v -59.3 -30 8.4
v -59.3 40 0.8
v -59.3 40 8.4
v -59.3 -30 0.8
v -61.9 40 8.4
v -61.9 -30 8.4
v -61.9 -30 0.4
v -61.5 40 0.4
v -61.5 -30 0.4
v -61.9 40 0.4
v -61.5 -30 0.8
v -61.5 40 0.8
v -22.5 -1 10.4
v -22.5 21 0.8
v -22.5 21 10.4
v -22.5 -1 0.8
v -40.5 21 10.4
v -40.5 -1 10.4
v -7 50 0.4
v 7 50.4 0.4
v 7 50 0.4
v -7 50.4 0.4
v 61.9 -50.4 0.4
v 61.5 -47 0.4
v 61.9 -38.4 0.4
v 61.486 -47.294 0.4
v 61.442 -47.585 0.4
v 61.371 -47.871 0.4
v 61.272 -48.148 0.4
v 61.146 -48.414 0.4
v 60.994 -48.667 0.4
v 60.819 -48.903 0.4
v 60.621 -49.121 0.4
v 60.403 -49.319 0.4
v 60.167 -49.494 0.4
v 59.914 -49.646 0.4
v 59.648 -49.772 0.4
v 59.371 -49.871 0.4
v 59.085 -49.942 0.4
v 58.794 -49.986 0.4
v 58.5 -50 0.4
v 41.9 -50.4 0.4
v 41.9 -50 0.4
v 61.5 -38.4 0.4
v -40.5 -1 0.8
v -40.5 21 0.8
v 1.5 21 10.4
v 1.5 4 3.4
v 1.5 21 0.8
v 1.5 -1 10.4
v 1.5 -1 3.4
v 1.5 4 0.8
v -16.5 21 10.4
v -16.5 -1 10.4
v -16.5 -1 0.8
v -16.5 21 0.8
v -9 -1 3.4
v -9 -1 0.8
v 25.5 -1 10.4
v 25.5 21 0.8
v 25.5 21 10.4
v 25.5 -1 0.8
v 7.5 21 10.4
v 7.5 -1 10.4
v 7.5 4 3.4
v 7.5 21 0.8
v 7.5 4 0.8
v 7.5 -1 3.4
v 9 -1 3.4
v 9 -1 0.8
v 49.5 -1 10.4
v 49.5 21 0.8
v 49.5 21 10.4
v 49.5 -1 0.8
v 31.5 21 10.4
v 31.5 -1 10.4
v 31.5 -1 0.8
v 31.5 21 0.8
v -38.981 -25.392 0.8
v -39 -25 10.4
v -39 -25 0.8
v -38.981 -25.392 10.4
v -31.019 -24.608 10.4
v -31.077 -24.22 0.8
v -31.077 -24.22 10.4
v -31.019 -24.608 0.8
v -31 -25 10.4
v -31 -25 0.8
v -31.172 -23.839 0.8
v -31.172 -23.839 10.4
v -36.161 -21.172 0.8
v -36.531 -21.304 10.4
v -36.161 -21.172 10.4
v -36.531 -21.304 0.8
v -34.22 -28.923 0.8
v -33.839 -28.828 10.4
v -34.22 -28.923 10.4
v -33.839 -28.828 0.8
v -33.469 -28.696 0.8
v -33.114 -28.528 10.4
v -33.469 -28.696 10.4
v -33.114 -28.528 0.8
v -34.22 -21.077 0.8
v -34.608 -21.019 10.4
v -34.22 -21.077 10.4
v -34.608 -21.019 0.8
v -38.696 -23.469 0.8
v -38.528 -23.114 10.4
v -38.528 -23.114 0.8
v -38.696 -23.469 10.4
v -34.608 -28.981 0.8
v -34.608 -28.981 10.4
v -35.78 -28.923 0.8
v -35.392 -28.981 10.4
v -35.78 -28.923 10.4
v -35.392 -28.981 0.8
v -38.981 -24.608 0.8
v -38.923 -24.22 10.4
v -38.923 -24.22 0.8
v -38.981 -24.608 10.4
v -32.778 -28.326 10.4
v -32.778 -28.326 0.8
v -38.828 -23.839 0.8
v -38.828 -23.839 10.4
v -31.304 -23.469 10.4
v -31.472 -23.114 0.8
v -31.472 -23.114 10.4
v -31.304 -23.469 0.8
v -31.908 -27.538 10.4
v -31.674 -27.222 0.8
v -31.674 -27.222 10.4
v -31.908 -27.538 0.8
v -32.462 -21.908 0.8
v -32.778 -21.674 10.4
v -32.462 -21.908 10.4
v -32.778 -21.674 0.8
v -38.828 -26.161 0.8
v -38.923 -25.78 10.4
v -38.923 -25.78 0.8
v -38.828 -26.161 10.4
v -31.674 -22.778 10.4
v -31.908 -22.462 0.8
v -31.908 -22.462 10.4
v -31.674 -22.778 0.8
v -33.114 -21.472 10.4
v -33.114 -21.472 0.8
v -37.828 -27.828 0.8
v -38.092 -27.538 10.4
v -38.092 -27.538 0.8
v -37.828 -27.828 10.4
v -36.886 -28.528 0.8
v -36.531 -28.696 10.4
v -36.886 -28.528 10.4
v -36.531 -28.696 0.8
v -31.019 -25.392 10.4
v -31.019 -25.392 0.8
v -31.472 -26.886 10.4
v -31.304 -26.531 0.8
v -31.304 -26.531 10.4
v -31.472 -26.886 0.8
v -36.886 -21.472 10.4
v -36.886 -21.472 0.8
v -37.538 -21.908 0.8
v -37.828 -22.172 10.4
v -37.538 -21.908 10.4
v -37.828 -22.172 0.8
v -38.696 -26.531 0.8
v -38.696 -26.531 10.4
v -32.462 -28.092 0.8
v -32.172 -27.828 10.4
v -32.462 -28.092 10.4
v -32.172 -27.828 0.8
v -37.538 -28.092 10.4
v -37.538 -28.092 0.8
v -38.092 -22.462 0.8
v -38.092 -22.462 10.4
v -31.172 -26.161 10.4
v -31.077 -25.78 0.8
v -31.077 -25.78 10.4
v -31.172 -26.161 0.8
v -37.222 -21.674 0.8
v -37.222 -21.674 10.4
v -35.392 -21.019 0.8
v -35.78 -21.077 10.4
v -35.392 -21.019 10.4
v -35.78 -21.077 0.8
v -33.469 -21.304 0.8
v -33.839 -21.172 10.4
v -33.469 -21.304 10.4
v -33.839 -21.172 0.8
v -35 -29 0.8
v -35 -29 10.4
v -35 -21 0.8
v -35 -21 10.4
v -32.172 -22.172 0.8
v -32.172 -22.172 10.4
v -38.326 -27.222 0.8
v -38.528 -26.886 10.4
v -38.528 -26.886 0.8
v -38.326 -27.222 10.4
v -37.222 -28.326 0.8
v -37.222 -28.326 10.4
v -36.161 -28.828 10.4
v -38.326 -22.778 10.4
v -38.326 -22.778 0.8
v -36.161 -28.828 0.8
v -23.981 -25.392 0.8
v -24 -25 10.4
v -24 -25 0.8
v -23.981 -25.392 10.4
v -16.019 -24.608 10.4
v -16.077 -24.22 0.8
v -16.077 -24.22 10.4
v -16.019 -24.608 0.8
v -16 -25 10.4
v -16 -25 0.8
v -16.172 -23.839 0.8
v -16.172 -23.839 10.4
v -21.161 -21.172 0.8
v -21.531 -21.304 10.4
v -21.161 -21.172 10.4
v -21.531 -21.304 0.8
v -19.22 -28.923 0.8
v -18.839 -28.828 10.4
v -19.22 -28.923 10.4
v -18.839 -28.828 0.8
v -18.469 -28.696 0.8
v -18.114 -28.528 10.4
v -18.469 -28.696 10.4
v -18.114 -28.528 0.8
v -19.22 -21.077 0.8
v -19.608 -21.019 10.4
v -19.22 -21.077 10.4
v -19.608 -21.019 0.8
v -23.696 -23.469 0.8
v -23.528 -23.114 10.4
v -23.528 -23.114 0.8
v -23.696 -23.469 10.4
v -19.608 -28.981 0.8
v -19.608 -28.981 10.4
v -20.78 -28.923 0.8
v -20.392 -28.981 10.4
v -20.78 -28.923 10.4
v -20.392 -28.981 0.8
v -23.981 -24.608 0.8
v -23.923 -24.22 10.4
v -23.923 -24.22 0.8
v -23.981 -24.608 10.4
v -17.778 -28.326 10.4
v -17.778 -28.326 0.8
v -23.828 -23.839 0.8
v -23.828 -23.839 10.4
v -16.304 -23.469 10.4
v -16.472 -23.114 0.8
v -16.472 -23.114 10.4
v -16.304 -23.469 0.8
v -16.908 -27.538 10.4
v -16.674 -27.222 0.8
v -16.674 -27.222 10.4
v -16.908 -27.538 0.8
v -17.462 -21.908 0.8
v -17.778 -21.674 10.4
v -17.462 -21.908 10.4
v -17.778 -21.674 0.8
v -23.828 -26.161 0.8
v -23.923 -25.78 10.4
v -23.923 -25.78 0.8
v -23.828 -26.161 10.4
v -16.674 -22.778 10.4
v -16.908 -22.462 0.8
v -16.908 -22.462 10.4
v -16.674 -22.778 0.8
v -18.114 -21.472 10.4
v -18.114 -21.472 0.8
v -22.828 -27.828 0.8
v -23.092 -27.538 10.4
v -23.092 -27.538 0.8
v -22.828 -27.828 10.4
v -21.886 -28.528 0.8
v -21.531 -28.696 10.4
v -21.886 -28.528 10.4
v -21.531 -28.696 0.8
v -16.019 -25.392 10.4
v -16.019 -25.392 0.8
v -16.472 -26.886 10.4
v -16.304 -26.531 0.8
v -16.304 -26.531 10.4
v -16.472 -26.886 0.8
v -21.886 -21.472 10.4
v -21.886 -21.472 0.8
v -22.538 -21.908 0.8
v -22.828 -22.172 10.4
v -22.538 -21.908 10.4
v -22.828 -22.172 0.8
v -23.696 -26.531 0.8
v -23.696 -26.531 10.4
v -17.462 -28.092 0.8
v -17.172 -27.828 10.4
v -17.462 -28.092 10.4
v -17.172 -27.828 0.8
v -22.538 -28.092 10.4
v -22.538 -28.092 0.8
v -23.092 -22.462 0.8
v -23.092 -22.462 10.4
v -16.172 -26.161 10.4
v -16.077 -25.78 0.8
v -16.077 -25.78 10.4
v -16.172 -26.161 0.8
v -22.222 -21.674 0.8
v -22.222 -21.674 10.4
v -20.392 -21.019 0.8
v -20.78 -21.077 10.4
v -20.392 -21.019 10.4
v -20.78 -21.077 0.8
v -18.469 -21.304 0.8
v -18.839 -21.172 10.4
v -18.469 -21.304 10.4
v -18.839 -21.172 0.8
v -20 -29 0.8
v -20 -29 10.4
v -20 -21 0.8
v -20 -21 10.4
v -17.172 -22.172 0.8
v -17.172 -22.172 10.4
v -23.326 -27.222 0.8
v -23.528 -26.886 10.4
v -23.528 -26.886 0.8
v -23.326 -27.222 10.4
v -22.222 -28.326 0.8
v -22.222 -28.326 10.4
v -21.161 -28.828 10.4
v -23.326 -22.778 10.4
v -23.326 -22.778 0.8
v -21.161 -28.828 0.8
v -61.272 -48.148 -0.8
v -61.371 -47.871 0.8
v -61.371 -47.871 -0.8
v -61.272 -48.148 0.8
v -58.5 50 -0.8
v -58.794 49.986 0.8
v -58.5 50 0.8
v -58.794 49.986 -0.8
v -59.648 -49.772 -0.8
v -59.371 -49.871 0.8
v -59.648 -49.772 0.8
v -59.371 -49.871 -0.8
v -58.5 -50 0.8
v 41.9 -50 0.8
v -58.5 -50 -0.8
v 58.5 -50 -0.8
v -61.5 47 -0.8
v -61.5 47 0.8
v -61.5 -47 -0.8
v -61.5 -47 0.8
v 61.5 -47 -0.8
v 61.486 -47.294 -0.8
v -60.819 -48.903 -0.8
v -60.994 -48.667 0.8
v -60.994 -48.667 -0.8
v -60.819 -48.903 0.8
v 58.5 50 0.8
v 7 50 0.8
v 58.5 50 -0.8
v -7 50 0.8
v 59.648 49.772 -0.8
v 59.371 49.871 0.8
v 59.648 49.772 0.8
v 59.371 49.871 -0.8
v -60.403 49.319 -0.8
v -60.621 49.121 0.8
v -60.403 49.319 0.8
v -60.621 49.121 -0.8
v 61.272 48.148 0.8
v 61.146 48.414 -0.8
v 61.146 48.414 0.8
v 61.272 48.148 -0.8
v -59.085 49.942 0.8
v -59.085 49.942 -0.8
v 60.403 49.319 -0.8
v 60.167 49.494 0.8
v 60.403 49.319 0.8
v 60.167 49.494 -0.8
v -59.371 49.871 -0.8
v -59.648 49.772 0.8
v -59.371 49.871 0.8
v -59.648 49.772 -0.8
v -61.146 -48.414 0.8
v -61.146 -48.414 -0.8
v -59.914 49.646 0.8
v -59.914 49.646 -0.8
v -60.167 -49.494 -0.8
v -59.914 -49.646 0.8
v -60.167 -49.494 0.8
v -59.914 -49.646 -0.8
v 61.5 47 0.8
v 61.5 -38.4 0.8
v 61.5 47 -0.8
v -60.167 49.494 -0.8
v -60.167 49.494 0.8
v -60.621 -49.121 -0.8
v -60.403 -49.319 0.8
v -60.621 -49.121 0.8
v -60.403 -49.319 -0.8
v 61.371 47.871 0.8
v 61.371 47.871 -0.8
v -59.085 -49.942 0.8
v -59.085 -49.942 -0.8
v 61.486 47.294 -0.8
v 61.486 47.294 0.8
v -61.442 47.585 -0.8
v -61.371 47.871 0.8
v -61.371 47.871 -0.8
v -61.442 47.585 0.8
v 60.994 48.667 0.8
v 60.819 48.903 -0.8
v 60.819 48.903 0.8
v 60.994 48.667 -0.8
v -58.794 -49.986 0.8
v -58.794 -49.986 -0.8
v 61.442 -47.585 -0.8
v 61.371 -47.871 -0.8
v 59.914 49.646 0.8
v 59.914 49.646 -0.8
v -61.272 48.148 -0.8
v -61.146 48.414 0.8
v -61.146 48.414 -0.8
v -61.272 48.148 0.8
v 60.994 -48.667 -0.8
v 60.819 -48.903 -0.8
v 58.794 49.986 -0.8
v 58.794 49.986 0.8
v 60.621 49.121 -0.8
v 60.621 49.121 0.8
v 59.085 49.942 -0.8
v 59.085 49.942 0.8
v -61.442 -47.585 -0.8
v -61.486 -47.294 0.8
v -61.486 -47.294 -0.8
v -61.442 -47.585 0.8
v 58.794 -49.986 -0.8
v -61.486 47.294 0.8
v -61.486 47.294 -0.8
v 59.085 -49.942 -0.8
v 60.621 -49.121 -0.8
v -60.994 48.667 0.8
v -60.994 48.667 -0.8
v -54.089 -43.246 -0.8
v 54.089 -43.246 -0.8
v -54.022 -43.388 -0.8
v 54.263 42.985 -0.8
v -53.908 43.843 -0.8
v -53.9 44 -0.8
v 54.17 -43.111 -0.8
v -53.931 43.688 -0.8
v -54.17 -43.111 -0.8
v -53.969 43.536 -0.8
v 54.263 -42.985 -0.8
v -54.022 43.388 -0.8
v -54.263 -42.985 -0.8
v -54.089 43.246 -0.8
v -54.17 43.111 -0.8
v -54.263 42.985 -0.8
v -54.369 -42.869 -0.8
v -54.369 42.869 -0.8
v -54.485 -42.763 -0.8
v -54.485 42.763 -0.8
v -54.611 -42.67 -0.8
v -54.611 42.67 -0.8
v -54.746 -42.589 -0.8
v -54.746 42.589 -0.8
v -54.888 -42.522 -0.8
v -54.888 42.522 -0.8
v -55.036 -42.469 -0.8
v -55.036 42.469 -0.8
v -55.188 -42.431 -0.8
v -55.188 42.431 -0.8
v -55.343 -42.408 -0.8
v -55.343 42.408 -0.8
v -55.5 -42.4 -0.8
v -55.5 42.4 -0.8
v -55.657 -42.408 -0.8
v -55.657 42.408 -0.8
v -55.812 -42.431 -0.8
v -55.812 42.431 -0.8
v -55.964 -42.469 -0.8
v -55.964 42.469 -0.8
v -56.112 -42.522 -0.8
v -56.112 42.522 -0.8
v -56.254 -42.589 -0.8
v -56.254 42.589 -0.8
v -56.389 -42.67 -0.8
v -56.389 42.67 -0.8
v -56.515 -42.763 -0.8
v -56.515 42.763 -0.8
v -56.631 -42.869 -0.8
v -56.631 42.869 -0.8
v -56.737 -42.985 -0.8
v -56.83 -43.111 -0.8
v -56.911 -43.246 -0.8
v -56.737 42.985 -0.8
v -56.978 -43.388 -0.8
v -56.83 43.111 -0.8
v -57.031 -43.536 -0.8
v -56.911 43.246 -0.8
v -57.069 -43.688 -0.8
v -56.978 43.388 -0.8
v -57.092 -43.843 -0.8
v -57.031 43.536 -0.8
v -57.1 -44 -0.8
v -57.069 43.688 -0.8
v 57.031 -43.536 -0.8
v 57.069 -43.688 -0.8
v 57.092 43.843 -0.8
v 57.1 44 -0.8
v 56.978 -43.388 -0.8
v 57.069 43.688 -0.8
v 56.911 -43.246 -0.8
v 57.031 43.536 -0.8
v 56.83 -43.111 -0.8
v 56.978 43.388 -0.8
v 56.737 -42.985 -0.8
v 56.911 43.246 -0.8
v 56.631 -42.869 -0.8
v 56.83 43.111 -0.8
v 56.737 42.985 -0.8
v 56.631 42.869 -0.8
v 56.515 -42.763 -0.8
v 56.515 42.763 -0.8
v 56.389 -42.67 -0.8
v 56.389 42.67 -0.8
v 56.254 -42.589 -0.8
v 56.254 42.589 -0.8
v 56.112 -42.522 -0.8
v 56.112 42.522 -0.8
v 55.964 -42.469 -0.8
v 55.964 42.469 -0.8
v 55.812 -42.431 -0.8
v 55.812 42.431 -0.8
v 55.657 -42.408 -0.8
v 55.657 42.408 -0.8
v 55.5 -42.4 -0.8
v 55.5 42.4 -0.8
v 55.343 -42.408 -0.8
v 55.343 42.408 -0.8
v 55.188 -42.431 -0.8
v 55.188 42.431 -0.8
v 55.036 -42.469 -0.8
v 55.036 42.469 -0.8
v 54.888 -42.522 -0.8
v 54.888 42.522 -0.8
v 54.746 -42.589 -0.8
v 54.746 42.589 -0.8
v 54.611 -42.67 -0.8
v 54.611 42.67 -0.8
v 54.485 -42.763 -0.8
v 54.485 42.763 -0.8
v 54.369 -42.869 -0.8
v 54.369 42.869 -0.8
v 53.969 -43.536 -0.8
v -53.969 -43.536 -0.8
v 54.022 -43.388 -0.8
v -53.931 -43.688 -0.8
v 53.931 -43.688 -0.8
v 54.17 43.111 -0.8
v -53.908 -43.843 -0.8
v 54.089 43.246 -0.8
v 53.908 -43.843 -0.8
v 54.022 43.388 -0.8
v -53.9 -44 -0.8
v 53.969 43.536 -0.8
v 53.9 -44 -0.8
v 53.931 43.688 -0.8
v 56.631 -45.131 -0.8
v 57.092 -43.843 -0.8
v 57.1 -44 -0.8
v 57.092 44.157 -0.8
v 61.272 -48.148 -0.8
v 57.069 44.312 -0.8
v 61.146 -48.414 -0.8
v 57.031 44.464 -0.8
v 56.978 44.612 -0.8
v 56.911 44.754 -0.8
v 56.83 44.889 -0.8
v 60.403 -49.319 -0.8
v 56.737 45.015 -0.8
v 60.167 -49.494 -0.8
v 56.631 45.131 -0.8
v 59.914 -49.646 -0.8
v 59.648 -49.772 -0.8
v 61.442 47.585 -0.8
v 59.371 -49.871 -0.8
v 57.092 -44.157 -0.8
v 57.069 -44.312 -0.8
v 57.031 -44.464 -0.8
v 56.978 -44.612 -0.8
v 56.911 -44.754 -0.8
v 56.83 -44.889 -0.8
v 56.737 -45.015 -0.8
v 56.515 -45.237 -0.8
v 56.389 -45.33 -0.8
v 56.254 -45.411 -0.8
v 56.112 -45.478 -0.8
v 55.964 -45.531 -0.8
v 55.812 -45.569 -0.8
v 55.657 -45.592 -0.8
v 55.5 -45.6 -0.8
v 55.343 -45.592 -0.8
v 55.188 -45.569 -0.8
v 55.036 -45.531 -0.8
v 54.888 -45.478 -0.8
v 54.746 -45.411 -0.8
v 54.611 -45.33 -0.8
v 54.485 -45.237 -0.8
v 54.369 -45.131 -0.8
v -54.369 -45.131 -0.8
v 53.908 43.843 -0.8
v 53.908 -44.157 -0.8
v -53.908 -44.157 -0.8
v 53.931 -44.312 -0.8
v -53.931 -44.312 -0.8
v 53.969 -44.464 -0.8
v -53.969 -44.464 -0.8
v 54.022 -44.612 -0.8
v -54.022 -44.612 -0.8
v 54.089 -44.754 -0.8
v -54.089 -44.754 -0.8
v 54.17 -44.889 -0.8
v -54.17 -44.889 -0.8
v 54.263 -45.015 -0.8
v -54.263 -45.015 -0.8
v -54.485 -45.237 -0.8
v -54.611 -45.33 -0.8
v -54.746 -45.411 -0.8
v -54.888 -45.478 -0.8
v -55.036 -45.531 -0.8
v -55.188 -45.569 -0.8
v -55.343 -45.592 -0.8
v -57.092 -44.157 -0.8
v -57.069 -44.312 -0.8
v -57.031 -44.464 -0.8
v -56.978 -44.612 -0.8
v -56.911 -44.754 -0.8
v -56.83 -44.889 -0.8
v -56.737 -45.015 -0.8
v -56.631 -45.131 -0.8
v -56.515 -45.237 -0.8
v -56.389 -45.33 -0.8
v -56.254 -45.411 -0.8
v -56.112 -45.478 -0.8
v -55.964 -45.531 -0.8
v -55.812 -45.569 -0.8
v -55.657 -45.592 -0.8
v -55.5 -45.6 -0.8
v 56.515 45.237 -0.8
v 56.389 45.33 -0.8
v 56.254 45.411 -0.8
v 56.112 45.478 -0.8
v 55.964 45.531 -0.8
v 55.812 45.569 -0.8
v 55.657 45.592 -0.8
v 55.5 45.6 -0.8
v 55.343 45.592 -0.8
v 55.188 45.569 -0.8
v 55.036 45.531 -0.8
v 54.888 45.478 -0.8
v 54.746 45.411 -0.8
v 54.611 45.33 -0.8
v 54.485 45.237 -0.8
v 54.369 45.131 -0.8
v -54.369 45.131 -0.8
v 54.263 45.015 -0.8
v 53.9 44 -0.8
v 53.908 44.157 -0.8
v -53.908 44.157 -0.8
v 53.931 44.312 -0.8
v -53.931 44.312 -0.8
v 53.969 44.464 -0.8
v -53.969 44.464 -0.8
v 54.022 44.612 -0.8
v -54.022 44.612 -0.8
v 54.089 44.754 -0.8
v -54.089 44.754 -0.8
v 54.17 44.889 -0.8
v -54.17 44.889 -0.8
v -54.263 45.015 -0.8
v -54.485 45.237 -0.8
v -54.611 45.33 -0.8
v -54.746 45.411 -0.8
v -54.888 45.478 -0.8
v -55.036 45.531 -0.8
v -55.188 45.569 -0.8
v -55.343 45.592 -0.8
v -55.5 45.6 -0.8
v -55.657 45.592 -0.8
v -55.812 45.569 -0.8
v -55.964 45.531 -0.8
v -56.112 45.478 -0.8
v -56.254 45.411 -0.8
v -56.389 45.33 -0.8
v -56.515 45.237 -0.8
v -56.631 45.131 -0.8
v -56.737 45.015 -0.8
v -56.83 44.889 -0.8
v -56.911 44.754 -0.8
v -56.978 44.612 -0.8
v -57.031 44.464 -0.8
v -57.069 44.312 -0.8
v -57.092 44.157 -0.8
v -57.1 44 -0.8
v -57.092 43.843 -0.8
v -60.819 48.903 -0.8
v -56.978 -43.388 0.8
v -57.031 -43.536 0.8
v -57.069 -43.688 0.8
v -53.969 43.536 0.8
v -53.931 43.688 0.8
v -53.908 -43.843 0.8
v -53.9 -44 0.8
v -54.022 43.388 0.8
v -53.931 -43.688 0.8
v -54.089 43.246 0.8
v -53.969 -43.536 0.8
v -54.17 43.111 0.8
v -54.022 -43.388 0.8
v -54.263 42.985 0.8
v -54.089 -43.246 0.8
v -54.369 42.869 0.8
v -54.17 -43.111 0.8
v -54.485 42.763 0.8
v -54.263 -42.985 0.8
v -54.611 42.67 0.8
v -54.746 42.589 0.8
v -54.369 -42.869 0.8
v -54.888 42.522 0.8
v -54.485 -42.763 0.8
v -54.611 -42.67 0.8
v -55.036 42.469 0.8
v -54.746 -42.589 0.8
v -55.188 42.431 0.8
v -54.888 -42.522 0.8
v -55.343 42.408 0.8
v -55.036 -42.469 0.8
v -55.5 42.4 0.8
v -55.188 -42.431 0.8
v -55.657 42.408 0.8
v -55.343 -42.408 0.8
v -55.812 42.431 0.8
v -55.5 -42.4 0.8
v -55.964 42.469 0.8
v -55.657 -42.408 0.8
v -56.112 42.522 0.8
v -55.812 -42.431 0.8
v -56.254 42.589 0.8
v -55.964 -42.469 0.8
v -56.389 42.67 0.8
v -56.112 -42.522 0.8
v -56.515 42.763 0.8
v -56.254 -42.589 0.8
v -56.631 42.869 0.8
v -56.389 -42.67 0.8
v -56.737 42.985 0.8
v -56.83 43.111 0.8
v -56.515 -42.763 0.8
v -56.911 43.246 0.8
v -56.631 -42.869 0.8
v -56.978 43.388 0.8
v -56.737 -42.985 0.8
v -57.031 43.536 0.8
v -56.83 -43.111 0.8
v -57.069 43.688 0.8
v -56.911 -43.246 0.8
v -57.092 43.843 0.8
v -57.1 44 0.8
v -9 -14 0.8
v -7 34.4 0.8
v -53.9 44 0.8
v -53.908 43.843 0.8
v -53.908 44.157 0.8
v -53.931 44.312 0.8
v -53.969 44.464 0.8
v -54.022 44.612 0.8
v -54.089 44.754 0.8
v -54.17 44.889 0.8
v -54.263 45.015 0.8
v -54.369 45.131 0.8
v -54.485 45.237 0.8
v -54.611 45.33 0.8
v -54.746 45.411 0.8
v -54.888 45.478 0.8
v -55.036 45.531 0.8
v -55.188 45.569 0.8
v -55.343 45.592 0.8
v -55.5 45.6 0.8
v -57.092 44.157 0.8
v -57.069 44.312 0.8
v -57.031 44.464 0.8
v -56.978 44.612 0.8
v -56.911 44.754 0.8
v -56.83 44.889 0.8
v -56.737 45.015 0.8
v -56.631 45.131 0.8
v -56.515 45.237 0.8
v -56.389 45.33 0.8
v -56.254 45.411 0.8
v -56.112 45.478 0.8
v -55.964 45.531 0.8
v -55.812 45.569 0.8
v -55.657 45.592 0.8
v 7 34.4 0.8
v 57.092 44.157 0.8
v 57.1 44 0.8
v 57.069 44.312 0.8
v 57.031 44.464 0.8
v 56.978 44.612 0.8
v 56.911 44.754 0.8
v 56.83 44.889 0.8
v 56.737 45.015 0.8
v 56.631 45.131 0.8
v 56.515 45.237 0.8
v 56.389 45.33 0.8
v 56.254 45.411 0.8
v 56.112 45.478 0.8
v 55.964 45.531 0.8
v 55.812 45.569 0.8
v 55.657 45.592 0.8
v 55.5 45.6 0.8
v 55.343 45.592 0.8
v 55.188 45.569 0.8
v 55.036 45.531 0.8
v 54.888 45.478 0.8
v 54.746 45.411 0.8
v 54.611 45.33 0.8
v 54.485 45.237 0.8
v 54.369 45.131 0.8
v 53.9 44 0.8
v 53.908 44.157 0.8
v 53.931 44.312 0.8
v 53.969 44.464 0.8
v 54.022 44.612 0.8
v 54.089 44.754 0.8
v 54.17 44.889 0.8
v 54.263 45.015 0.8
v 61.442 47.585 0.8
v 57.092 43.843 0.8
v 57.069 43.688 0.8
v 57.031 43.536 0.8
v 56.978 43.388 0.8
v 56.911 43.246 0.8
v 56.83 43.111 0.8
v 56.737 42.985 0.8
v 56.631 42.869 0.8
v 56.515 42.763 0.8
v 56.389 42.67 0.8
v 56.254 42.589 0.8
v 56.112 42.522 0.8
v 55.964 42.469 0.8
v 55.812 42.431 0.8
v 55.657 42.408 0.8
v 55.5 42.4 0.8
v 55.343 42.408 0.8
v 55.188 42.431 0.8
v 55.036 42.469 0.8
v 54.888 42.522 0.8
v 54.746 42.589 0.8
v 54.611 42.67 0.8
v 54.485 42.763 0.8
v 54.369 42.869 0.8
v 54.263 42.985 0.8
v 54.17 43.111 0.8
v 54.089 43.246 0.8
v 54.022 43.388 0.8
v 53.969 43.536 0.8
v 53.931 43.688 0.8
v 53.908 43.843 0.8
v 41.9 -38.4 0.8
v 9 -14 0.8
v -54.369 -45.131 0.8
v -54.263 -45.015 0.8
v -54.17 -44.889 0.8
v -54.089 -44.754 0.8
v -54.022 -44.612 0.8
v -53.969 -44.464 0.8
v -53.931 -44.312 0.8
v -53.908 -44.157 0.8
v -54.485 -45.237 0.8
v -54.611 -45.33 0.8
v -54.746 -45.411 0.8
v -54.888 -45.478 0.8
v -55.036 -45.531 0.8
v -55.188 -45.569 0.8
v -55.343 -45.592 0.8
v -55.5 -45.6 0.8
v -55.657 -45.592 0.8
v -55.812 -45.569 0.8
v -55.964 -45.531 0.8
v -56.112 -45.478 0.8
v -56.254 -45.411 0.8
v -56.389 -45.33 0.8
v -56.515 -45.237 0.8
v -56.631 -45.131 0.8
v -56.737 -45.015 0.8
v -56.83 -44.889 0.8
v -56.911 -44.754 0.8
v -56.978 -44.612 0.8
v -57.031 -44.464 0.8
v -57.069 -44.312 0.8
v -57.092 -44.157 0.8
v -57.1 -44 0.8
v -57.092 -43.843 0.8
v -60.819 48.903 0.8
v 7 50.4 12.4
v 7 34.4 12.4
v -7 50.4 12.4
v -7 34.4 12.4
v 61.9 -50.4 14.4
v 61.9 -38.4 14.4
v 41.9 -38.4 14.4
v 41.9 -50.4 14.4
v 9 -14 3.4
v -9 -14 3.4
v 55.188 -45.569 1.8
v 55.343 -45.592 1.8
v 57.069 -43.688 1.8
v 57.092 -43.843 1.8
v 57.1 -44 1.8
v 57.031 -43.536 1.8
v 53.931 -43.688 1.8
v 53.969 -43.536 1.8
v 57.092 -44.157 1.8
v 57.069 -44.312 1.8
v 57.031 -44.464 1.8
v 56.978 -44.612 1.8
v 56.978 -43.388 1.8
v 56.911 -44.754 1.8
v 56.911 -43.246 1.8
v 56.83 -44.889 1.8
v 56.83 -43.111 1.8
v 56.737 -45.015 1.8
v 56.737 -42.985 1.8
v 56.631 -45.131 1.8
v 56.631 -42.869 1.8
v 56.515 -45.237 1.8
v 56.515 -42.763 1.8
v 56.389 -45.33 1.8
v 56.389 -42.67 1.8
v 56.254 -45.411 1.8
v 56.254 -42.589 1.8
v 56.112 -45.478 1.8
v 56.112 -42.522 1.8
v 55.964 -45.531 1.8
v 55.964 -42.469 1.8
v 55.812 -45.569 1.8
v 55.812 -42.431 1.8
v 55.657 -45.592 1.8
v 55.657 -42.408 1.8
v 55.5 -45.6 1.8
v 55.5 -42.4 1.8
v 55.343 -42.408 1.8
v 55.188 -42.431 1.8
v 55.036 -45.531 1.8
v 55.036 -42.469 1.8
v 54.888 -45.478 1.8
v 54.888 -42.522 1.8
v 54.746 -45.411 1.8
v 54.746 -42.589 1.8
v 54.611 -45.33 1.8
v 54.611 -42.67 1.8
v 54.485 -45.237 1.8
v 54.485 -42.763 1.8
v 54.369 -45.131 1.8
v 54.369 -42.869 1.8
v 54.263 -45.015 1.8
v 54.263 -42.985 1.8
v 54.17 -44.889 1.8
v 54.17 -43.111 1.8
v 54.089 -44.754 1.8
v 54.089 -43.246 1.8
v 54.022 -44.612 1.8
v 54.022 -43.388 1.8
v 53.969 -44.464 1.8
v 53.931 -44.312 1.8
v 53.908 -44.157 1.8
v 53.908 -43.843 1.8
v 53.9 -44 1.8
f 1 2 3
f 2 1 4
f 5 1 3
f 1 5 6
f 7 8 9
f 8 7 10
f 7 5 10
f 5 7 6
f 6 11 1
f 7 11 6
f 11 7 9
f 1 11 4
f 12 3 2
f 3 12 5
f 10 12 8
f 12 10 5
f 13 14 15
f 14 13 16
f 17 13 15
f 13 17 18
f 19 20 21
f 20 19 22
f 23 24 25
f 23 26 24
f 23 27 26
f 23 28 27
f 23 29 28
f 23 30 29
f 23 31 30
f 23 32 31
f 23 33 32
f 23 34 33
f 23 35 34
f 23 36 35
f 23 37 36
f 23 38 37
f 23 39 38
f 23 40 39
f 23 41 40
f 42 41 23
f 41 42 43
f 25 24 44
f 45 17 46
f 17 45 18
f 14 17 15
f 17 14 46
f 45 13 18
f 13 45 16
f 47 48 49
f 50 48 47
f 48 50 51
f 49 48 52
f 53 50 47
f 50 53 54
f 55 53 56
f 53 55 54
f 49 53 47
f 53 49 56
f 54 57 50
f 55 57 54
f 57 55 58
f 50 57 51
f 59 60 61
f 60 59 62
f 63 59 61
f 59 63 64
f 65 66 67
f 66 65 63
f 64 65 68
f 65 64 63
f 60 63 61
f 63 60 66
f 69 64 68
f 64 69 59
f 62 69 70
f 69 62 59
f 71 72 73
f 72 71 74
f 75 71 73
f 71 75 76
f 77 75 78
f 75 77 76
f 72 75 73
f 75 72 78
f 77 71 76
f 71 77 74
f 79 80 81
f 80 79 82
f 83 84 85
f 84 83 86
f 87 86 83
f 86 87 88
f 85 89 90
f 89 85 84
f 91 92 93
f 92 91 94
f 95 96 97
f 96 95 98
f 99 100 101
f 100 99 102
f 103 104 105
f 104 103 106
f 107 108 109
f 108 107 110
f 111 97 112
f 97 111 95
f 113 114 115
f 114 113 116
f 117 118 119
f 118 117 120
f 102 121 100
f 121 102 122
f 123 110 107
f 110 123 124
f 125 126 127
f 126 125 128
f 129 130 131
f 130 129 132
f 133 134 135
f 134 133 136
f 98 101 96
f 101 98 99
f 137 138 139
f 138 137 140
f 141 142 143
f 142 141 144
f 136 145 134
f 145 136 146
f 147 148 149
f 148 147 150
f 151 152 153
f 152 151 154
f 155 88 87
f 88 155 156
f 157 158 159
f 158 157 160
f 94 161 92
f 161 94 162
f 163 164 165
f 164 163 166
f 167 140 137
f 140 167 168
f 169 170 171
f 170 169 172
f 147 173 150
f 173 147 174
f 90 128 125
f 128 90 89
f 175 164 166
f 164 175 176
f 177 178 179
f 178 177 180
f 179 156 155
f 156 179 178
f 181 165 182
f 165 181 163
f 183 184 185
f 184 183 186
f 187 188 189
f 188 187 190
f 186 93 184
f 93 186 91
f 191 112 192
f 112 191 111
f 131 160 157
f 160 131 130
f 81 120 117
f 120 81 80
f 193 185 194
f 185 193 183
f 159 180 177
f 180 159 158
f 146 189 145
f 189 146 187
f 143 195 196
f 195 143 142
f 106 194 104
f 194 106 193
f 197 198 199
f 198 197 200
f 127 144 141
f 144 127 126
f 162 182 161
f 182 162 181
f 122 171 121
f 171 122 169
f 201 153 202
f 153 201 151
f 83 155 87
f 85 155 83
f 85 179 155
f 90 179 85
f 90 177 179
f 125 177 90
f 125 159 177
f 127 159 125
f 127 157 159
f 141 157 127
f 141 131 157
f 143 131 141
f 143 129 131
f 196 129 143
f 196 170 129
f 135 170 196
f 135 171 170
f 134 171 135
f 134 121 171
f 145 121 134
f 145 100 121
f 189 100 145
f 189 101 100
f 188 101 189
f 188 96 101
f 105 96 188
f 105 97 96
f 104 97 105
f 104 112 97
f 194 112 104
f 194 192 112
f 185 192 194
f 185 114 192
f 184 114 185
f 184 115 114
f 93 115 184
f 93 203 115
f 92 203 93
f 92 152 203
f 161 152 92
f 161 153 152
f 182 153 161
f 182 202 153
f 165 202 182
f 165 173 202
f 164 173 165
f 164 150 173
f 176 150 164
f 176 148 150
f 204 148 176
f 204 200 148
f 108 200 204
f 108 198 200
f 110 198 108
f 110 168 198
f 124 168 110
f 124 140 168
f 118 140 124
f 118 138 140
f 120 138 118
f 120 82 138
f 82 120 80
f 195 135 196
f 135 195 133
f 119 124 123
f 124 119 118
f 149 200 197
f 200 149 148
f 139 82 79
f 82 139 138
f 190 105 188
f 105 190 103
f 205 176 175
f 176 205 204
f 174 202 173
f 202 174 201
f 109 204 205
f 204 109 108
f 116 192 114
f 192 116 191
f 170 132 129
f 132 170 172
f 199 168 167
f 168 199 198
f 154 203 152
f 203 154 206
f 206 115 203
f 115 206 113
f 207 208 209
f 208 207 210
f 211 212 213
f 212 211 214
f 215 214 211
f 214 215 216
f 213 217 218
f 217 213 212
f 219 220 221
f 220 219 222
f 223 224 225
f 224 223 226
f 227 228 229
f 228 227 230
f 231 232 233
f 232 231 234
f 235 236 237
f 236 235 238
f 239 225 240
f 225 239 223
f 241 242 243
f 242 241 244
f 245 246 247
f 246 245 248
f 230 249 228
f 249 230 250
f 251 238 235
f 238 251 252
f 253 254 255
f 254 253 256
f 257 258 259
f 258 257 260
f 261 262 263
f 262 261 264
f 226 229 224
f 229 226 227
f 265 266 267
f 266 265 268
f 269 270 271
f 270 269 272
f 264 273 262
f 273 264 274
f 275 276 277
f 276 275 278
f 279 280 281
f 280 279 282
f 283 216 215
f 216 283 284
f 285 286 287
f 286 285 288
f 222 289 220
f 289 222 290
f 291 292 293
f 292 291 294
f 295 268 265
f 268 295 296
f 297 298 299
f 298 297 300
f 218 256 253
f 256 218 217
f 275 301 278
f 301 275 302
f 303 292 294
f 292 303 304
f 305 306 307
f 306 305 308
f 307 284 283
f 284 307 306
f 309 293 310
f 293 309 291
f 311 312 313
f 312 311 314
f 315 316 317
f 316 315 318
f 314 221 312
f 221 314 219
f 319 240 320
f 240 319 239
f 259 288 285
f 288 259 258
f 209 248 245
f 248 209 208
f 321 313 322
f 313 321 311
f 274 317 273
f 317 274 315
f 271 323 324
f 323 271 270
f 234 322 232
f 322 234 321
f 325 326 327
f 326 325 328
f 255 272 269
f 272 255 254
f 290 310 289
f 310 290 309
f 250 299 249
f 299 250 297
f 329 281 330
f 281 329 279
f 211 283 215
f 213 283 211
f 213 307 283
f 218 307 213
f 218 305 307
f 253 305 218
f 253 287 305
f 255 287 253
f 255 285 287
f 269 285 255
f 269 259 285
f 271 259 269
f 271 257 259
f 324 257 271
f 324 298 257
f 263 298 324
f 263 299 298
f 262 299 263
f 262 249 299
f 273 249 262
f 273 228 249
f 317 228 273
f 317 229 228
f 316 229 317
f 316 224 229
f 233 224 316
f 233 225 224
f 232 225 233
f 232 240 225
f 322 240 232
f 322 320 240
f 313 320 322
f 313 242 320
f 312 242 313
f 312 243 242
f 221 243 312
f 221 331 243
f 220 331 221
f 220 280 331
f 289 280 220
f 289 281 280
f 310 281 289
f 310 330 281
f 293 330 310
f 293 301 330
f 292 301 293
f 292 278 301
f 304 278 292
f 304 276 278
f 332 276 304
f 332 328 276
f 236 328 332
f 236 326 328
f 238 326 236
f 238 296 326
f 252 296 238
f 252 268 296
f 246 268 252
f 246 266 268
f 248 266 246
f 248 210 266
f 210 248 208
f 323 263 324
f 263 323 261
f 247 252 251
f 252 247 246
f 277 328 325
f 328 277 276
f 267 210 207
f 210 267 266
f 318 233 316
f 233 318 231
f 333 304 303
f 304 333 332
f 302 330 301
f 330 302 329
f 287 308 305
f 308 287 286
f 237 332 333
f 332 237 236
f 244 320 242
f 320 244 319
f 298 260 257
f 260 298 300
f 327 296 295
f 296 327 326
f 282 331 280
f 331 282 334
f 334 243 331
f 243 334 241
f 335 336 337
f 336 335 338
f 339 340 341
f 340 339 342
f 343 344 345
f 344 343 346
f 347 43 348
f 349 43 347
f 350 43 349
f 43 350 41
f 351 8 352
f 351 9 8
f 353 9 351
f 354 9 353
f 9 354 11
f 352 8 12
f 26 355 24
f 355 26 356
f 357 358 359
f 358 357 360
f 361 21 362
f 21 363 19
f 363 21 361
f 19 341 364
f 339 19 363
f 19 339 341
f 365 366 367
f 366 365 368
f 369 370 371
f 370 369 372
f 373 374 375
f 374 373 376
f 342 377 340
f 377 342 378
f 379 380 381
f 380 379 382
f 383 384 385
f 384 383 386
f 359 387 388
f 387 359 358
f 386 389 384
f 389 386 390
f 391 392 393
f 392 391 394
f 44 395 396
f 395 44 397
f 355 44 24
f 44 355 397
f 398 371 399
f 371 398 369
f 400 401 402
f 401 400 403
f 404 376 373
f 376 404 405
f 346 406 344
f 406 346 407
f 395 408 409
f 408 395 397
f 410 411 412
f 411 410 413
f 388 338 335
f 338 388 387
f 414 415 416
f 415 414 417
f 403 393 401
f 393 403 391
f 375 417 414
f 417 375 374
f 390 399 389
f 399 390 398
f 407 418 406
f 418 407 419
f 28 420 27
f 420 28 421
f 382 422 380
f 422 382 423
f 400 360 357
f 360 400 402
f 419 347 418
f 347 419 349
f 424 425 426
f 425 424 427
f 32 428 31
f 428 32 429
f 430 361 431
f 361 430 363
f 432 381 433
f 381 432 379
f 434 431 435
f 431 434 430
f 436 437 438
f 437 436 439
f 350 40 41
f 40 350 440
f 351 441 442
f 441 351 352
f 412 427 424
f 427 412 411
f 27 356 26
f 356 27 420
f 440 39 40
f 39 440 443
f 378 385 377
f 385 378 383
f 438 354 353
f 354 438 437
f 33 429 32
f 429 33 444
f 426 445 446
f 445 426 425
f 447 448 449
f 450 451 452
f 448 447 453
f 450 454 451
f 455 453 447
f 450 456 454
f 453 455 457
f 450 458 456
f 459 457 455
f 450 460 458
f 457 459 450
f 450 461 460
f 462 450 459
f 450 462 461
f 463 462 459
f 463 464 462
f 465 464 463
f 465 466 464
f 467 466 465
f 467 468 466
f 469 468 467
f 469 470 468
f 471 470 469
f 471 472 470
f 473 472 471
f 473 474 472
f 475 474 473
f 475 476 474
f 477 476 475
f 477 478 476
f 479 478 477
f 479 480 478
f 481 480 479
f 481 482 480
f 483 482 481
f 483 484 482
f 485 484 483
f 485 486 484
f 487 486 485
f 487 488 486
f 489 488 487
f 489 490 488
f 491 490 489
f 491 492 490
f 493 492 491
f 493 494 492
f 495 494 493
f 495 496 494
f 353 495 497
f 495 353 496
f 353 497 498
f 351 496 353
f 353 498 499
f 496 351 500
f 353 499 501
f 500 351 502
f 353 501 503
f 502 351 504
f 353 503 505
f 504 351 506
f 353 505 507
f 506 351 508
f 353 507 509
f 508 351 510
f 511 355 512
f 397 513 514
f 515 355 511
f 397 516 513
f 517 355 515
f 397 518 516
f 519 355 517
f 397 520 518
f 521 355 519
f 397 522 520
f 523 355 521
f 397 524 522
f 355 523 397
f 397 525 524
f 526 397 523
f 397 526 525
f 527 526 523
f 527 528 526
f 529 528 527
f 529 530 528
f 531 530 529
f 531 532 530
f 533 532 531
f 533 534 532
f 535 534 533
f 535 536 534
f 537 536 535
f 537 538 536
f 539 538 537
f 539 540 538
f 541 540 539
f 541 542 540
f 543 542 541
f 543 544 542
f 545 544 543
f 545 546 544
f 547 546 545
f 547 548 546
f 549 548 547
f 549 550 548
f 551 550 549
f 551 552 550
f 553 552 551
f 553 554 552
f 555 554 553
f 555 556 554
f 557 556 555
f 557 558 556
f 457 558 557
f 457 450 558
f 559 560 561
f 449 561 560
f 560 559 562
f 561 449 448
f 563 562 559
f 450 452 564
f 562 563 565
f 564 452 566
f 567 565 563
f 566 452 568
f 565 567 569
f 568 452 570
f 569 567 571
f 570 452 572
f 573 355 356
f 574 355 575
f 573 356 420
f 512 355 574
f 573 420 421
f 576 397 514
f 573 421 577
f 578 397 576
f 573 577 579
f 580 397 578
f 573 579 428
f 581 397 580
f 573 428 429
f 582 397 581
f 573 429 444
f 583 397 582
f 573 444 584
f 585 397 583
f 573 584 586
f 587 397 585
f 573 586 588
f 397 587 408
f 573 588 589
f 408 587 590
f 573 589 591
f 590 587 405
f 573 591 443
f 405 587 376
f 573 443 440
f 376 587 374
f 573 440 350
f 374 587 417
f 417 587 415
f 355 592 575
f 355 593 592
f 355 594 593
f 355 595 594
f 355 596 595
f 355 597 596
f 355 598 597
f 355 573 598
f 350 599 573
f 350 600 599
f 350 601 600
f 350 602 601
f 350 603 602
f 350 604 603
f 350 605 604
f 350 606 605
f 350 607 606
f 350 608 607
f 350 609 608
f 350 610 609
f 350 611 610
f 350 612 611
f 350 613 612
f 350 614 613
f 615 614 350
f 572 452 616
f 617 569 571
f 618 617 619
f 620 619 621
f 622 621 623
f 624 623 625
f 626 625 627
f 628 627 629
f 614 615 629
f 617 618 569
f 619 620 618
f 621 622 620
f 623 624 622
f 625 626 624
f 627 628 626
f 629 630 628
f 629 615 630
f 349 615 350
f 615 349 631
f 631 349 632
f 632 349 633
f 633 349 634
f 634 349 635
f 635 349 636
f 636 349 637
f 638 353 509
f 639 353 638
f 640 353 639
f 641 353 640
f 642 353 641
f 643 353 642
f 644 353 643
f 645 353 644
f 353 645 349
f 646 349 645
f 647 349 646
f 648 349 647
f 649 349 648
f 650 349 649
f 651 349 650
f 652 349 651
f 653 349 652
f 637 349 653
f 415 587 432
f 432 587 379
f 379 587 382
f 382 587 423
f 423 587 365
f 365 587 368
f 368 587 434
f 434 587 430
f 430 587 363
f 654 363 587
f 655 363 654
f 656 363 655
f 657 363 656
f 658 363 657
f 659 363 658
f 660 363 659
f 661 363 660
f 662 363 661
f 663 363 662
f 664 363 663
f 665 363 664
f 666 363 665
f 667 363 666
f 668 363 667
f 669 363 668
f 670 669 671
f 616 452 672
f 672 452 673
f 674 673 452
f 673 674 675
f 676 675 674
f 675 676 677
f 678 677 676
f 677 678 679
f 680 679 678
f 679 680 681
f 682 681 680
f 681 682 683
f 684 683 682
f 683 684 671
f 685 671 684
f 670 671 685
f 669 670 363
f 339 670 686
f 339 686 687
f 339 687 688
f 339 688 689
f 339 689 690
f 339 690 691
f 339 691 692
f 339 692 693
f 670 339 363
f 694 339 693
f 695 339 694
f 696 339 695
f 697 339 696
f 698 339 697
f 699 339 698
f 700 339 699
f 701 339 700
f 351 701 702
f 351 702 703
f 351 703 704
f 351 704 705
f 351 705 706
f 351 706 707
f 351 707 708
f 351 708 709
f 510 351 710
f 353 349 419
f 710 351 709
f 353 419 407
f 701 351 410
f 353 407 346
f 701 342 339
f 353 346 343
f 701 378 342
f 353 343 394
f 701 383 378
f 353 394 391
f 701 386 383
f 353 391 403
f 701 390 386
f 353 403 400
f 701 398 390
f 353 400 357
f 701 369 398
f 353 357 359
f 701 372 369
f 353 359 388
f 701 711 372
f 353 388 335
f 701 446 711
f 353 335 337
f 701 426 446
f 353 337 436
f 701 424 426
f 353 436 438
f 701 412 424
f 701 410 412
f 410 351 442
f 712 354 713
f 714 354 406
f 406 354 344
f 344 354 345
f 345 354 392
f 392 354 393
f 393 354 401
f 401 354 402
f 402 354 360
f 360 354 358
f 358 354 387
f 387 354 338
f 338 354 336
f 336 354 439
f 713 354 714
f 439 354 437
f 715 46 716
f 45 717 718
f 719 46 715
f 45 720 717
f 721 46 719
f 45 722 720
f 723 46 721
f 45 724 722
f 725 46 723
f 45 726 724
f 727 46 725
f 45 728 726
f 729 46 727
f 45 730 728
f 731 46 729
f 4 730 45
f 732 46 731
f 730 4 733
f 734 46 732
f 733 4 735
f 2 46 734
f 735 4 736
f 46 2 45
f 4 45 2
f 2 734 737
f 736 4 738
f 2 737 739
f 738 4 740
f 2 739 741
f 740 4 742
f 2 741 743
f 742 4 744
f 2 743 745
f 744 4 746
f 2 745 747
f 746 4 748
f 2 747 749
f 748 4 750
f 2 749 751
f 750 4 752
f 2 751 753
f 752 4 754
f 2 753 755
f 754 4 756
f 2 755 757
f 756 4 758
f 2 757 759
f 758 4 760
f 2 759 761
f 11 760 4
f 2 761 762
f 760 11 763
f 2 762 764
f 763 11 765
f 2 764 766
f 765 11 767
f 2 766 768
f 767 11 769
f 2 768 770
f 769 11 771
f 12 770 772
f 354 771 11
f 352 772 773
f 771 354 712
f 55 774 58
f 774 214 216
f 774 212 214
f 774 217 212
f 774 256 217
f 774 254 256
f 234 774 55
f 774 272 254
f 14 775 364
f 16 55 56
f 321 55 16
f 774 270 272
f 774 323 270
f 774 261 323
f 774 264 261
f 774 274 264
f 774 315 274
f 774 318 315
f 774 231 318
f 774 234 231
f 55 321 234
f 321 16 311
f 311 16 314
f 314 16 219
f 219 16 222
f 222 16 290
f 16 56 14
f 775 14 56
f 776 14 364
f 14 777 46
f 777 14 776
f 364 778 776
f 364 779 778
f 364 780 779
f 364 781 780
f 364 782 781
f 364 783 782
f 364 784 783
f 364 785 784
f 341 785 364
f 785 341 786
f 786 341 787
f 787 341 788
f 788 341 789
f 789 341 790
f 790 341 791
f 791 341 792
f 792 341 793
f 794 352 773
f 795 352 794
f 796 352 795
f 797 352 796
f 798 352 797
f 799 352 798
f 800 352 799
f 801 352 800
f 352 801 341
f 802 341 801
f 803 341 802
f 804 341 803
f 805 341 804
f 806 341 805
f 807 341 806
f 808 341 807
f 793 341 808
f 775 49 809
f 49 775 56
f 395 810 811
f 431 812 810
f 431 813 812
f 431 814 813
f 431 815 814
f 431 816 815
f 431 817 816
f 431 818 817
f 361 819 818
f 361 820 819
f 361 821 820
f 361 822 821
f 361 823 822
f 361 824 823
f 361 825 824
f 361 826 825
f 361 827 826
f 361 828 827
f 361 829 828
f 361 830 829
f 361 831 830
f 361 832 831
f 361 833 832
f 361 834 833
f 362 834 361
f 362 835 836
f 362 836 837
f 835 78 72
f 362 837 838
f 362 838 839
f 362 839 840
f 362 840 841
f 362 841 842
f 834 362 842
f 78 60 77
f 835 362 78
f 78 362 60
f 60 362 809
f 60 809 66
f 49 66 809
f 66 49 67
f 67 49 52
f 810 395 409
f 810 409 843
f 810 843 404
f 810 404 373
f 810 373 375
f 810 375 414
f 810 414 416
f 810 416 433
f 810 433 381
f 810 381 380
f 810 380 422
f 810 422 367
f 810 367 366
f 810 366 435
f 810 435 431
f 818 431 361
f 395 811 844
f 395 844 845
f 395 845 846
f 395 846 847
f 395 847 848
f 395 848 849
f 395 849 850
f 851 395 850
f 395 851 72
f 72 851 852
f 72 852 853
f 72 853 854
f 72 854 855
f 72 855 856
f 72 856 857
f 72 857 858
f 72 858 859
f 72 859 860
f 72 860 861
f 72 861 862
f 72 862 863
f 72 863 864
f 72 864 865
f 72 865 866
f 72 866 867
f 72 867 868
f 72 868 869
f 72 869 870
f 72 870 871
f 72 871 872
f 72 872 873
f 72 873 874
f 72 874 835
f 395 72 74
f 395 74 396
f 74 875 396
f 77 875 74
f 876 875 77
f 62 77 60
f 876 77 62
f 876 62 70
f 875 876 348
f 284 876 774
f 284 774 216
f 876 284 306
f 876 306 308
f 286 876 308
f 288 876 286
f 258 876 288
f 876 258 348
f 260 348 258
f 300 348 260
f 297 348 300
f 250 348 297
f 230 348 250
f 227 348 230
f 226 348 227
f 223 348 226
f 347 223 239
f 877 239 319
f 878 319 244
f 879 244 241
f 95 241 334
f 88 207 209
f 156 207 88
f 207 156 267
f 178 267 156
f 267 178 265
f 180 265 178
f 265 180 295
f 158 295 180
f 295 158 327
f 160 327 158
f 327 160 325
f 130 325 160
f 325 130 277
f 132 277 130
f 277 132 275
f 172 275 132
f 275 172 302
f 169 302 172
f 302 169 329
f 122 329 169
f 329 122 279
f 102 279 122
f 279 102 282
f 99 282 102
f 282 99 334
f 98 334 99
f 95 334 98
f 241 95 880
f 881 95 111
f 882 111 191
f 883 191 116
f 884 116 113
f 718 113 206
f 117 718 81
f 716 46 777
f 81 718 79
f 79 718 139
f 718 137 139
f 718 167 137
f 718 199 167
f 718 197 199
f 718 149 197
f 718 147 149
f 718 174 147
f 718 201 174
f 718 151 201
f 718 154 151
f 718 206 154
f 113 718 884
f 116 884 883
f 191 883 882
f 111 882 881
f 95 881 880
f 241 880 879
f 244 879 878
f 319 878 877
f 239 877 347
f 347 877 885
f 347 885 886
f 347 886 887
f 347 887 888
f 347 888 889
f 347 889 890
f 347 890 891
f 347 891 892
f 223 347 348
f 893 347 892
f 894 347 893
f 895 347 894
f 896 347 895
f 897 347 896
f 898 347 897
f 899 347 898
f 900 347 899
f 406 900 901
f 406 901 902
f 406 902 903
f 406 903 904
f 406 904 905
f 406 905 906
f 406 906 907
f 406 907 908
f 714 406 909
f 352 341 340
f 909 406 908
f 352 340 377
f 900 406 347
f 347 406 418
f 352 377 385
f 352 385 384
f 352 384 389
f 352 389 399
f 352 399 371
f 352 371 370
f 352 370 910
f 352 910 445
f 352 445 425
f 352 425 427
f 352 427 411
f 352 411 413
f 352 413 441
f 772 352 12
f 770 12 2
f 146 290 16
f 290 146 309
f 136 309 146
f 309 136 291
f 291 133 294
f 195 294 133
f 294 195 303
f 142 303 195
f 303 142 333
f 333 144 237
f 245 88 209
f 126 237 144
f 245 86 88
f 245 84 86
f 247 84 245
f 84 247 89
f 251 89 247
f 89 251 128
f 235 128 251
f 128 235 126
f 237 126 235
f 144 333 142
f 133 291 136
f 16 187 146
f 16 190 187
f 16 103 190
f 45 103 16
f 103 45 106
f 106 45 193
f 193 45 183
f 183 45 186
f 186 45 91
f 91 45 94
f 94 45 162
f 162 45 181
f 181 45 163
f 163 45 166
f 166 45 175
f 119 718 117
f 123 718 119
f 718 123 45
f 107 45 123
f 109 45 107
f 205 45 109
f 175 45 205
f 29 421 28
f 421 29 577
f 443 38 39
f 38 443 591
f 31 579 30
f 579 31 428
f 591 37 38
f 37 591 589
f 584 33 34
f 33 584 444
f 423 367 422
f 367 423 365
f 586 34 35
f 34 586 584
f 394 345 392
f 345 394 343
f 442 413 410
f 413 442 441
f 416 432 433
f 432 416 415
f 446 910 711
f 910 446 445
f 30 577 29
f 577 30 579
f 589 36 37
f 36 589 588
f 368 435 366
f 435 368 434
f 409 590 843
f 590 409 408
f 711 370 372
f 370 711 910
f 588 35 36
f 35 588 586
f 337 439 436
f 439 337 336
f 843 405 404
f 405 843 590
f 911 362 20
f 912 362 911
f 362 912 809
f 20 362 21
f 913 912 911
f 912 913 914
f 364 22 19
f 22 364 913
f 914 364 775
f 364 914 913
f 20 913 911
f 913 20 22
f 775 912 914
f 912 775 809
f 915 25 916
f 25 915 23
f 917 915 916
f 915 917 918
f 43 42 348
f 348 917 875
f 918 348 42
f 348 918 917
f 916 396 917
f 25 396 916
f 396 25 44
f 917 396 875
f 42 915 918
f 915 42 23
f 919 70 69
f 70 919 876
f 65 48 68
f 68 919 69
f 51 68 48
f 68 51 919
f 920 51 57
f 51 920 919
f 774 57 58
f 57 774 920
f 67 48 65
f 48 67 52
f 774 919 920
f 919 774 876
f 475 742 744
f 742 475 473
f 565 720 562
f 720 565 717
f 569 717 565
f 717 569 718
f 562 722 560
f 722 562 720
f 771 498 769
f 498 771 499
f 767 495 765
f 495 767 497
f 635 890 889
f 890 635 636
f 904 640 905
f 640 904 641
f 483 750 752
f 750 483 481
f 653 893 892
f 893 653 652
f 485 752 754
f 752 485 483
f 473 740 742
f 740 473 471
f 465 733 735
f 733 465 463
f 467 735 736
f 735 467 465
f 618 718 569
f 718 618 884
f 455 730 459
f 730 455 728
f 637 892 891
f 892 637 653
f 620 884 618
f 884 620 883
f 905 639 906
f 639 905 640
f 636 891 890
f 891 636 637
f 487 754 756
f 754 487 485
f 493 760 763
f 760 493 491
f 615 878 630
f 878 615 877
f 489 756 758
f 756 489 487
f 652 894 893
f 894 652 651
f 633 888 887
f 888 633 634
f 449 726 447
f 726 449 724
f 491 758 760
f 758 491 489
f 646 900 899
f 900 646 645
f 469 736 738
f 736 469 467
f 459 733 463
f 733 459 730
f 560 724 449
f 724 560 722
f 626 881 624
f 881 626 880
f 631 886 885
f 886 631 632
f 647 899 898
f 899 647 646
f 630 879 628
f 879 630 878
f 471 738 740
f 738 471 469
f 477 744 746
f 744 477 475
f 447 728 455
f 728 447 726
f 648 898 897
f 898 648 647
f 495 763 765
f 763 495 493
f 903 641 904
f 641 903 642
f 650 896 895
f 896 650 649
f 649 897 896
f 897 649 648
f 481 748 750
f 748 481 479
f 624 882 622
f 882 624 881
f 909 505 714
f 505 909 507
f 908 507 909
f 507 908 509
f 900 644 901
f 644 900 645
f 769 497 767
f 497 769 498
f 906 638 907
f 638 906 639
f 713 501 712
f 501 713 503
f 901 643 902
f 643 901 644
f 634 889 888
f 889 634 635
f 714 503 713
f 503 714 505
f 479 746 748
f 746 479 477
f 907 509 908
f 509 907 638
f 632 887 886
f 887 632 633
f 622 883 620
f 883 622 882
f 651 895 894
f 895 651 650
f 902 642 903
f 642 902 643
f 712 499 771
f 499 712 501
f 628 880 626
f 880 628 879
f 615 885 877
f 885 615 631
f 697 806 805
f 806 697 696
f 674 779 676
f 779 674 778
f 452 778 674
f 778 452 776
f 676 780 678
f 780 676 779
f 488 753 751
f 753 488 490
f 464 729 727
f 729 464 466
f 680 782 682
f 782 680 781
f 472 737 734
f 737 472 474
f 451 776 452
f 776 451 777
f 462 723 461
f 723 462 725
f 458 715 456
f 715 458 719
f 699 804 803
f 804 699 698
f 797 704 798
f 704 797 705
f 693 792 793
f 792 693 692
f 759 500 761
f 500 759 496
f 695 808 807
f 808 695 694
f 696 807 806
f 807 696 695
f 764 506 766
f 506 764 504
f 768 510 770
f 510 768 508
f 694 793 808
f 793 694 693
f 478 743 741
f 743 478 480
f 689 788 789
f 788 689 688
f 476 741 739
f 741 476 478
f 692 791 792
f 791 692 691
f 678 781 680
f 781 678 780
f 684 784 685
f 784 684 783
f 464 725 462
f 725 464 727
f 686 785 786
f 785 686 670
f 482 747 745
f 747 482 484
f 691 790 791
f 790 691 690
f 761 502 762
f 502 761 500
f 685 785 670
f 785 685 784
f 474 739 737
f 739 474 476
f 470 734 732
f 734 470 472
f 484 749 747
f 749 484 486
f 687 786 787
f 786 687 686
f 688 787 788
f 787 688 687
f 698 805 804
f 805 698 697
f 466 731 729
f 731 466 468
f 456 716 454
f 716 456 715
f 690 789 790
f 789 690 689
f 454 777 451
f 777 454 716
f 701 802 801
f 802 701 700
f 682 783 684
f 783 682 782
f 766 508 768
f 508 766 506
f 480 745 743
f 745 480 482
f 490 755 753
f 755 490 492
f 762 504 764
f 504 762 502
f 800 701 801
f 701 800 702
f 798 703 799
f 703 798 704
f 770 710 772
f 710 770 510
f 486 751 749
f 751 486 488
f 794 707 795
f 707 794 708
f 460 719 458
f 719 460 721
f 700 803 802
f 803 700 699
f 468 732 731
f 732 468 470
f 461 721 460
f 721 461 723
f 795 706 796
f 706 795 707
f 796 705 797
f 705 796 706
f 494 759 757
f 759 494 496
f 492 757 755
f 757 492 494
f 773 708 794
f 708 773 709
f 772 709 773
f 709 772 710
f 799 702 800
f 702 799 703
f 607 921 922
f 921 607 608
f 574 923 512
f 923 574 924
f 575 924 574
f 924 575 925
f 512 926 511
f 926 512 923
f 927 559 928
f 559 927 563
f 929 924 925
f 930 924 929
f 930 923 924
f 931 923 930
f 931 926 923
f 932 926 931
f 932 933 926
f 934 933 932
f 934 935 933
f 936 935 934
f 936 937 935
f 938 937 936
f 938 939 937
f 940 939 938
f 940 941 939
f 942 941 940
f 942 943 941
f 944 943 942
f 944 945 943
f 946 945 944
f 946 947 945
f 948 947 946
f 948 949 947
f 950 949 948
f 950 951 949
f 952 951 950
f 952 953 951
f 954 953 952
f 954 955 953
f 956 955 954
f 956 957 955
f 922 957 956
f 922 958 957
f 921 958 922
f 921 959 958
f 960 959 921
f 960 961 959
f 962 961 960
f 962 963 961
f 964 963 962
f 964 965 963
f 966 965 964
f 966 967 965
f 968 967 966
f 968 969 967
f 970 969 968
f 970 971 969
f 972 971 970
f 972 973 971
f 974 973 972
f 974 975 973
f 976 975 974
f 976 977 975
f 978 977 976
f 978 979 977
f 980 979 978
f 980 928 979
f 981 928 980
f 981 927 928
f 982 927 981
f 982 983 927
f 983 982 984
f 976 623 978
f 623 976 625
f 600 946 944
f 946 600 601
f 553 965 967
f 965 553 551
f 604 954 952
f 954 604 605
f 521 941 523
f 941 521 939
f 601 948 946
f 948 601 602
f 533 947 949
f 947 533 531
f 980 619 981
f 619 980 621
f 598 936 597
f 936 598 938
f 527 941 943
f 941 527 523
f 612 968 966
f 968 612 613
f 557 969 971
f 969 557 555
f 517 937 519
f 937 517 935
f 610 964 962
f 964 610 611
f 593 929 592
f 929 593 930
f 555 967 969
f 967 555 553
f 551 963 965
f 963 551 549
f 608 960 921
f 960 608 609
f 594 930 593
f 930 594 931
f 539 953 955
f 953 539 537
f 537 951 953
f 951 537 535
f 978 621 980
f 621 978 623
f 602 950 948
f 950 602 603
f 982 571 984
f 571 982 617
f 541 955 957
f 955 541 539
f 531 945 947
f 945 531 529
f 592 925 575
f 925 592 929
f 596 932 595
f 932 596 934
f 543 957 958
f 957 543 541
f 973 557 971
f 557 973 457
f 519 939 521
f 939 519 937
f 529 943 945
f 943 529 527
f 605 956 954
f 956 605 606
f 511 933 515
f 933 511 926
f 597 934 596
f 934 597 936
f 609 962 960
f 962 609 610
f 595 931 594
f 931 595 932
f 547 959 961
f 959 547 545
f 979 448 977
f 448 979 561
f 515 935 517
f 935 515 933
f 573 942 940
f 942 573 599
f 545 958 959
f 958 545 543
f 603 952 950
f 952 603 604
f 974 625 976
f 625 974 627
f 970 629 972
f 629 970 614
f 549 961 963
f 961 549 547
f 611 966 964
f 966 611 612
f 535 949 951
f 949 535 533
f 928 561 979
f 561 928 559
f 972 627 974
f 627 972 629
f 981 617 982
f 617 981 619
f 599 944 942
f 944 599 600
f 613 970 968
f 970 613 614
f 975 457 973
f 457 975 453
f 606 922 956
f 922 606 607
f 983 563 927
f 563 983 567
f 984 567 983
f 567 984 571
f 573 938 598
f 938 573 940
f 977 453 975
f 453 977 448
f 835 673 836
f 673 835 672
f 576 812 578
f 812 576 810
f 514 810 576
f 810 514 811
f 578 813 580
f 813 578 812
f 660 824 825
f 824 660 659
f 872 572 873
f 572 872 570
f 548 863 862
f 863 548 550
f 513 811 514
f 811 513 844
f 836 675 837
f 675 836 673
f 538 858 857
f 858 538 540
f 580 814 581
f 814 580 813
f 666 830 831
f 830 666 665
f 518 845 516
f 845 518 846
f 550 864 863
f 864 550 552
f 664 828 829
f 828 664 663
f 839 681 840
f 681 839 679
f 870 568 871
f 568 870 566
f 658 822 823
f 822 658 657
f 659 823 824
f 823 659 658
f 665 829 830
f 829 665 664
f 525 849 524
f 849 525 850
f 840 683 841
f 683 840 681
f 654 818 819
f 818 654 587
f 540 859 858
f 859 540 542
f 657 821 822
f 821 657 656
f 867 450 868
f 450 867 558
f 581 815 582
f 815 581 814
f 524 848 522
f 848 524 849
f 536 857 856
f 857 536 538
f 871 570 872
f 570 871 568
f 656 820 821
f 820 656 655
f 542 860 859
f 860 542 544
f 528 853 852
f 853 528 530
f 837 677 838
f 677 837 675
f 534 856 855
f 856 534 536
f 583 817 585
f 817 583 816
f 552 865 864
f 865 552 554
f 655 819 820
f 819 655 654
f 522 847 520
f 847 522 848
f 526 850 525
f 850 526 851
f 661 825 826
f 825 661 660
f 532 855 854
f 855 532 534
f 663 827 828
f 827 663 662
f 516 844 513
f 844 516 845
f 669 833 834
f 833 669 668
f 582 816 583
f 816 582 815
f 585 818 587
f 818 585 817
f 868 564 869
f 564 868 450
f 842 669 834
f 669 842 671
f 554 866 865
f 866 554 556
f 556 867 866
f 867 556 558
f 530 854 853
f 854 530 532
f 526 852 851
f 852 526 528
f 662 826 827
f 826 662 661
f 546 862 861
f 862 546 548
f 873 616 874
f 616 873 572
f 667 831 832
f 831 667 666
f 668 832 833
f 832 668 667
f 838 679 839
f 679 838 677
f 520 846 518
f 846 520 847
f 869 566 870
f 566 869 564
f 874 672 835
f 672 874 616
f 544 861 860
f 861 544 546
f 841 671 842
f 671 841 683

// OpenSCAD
$fn = 64;

// Control board overall size (must match)
board_x = 123.0;
board_y = 100.0;
board_th = 1.6;

// Visual feature sizes (approximate, but all connected)
corner_r = 3.0;

// Mounting holes (typical M3 clearance)
hole_d = 3.2;
hole_edge_x = 6.0;
hole_edge_y = 6.0;

// Component heights
soldermask_bump = 0.25;   // slight top relief so renders aren't "flat"
connector_h = 12.0;
ic_h = 3.0;
cap_h = 10.0;
terminal_h = 14.0;

// Small overlap to guarantee connectivity
ov = 0.4;

// Helpers
module rounded_plate(x, y, z, r) {
    // Rounded rectangle prism using hull of corner cylinders
    hull() {
        for (sx = [-1, 1], sy = [-1, 1])
            translate([sx*(x/2 - r), sy*(y/2 - r), 0])
                cylinder(r=r, h=z, center=true);
    }
}

module mount_holes() {
    for (sx = [-1, 1], sy = [-1, 1])
        translate([sx*(board_x/2 - hole_edge_x), sy*(board_y/2 - hole_edge_y), 0])
            cylinder(d=hole_d, h=board_th + 2, center=true);
}

module usb_connector() {
    // USB-B like block on one edge
    usb_w = 14.0;
    usb_d = 16.0;
    usb_h = connector_h;

    translate([0, board_y/2 - usb_d/2 + ov, board_th/2 + usb_h/2 - ov])
        cube([usb_w, usb_d, usb_h], center=true);
}

module power_terminal() {
    // Screw terminal block near an edge
    term_w = 20.0;
    term_d = 12.0;
    term_h = terminal_h;

    translate([board_x/2 - term_w/2 + ov, -board_y/2 + term_d/2 - ov, board_th/2 + term_h/2 - ov])
        cube([term_w, term_d, term_h], center=true);
}

module pin_headers() {
    // Two long header strips along one side
    hdr_w = 2.6;
    hdr_h = 8.0;
    hdr_d1 = 60.0;
    hdr_d2 = 40.0;

    x_pos = -board_x/2 + hdr_w/2 - ov;

    translate([x_pos, 0, board_th/2 + hdr_h/2 - ov])
        cube([hdr_w, hdr_d1, hdr_h], center=true);

    translate([x_pos, board_y/2 - hdr_d2/2 - 10.0, board_th/2 + hdr_h/2 - ov])
        cube([hdr_w, hdr_d2, hdr_h], center=true);
}

module stepper_drivers() {
    // 4 driver modules as raised blocks
    drv_x = 18.0;
    drv_y = 22.0;
    drv_h = 10.0;

    spacing = 24.0;
    y0 = 10.0;

    for (i = [0:3]) {
        translate([-board_x/2 + 30.0 + i*spacing, y0, board_th/2 + drv_h/2 - ov])
            cube([drv_x, drv_y, drv_h], center=true);
    }
}

module main_ic() {
    // Central MCU/IC
    ic_x = 18.0;
    ic_y = 18.0;
    translate([0, -5.0, board_th/2 + ic_h/2 - ov])
        cube([ic_x, ic_y, ic_h], center=true);
}

module capacitors() {
    // Two electrolytic caps as cylinders
    cap_r = 4.0;
    cap_hh = cap_h;

    for (p = [[-35, -25], [-20, -25]]) {
        translate([p[0], p[1], board_th/2 + cap_hh/2 - ov])
            cylinder(r=cap_r, h=cap_hh, center=true);
    }
}

module top_relief() {
    // Slight raised "soldermask" islands to avoid blank/flat look
    island_h = soldermask_bump;
    island_z = board_th/2 + island_h/2 - ov;

    translate([0, 0, island_z])
        cube([board_x - 10, board_y - 10, island_h], center=true);

    translate([0, 0, island_z])
        cube([board_x - 30, board_y - 30, island_h], center=true);
}

// Build: one connected solid (holes are subtracted but do not disconnect the solid)
difference() {
    union() {
        // Board base (centered for easier feature placement)
        color([0.05, 0.45, 0.12])
            rounded_plate(board_x, board_y, board_th, corner_r);

        // Connected top features
        color([0.15, 0.15, 0.15]) usb_connector();
        color([0.10, 0.10, 0.10]) power_terminal();
        color([0.20, 0.20, 0.20]) pin_headers();
        color([0.25, 0.25, 0.25]) stepper_drivers();
        color([0.12, 0.12, 0.12]) main_ic();
        color([0.18, 0.18, 0.18]) capacitors();

        // Subtle relief on top surface
        color([0.06, 0.50, 0.14]) top_relief();
    }

    // Mounting holes through the PCB
    mount_holes();
}
